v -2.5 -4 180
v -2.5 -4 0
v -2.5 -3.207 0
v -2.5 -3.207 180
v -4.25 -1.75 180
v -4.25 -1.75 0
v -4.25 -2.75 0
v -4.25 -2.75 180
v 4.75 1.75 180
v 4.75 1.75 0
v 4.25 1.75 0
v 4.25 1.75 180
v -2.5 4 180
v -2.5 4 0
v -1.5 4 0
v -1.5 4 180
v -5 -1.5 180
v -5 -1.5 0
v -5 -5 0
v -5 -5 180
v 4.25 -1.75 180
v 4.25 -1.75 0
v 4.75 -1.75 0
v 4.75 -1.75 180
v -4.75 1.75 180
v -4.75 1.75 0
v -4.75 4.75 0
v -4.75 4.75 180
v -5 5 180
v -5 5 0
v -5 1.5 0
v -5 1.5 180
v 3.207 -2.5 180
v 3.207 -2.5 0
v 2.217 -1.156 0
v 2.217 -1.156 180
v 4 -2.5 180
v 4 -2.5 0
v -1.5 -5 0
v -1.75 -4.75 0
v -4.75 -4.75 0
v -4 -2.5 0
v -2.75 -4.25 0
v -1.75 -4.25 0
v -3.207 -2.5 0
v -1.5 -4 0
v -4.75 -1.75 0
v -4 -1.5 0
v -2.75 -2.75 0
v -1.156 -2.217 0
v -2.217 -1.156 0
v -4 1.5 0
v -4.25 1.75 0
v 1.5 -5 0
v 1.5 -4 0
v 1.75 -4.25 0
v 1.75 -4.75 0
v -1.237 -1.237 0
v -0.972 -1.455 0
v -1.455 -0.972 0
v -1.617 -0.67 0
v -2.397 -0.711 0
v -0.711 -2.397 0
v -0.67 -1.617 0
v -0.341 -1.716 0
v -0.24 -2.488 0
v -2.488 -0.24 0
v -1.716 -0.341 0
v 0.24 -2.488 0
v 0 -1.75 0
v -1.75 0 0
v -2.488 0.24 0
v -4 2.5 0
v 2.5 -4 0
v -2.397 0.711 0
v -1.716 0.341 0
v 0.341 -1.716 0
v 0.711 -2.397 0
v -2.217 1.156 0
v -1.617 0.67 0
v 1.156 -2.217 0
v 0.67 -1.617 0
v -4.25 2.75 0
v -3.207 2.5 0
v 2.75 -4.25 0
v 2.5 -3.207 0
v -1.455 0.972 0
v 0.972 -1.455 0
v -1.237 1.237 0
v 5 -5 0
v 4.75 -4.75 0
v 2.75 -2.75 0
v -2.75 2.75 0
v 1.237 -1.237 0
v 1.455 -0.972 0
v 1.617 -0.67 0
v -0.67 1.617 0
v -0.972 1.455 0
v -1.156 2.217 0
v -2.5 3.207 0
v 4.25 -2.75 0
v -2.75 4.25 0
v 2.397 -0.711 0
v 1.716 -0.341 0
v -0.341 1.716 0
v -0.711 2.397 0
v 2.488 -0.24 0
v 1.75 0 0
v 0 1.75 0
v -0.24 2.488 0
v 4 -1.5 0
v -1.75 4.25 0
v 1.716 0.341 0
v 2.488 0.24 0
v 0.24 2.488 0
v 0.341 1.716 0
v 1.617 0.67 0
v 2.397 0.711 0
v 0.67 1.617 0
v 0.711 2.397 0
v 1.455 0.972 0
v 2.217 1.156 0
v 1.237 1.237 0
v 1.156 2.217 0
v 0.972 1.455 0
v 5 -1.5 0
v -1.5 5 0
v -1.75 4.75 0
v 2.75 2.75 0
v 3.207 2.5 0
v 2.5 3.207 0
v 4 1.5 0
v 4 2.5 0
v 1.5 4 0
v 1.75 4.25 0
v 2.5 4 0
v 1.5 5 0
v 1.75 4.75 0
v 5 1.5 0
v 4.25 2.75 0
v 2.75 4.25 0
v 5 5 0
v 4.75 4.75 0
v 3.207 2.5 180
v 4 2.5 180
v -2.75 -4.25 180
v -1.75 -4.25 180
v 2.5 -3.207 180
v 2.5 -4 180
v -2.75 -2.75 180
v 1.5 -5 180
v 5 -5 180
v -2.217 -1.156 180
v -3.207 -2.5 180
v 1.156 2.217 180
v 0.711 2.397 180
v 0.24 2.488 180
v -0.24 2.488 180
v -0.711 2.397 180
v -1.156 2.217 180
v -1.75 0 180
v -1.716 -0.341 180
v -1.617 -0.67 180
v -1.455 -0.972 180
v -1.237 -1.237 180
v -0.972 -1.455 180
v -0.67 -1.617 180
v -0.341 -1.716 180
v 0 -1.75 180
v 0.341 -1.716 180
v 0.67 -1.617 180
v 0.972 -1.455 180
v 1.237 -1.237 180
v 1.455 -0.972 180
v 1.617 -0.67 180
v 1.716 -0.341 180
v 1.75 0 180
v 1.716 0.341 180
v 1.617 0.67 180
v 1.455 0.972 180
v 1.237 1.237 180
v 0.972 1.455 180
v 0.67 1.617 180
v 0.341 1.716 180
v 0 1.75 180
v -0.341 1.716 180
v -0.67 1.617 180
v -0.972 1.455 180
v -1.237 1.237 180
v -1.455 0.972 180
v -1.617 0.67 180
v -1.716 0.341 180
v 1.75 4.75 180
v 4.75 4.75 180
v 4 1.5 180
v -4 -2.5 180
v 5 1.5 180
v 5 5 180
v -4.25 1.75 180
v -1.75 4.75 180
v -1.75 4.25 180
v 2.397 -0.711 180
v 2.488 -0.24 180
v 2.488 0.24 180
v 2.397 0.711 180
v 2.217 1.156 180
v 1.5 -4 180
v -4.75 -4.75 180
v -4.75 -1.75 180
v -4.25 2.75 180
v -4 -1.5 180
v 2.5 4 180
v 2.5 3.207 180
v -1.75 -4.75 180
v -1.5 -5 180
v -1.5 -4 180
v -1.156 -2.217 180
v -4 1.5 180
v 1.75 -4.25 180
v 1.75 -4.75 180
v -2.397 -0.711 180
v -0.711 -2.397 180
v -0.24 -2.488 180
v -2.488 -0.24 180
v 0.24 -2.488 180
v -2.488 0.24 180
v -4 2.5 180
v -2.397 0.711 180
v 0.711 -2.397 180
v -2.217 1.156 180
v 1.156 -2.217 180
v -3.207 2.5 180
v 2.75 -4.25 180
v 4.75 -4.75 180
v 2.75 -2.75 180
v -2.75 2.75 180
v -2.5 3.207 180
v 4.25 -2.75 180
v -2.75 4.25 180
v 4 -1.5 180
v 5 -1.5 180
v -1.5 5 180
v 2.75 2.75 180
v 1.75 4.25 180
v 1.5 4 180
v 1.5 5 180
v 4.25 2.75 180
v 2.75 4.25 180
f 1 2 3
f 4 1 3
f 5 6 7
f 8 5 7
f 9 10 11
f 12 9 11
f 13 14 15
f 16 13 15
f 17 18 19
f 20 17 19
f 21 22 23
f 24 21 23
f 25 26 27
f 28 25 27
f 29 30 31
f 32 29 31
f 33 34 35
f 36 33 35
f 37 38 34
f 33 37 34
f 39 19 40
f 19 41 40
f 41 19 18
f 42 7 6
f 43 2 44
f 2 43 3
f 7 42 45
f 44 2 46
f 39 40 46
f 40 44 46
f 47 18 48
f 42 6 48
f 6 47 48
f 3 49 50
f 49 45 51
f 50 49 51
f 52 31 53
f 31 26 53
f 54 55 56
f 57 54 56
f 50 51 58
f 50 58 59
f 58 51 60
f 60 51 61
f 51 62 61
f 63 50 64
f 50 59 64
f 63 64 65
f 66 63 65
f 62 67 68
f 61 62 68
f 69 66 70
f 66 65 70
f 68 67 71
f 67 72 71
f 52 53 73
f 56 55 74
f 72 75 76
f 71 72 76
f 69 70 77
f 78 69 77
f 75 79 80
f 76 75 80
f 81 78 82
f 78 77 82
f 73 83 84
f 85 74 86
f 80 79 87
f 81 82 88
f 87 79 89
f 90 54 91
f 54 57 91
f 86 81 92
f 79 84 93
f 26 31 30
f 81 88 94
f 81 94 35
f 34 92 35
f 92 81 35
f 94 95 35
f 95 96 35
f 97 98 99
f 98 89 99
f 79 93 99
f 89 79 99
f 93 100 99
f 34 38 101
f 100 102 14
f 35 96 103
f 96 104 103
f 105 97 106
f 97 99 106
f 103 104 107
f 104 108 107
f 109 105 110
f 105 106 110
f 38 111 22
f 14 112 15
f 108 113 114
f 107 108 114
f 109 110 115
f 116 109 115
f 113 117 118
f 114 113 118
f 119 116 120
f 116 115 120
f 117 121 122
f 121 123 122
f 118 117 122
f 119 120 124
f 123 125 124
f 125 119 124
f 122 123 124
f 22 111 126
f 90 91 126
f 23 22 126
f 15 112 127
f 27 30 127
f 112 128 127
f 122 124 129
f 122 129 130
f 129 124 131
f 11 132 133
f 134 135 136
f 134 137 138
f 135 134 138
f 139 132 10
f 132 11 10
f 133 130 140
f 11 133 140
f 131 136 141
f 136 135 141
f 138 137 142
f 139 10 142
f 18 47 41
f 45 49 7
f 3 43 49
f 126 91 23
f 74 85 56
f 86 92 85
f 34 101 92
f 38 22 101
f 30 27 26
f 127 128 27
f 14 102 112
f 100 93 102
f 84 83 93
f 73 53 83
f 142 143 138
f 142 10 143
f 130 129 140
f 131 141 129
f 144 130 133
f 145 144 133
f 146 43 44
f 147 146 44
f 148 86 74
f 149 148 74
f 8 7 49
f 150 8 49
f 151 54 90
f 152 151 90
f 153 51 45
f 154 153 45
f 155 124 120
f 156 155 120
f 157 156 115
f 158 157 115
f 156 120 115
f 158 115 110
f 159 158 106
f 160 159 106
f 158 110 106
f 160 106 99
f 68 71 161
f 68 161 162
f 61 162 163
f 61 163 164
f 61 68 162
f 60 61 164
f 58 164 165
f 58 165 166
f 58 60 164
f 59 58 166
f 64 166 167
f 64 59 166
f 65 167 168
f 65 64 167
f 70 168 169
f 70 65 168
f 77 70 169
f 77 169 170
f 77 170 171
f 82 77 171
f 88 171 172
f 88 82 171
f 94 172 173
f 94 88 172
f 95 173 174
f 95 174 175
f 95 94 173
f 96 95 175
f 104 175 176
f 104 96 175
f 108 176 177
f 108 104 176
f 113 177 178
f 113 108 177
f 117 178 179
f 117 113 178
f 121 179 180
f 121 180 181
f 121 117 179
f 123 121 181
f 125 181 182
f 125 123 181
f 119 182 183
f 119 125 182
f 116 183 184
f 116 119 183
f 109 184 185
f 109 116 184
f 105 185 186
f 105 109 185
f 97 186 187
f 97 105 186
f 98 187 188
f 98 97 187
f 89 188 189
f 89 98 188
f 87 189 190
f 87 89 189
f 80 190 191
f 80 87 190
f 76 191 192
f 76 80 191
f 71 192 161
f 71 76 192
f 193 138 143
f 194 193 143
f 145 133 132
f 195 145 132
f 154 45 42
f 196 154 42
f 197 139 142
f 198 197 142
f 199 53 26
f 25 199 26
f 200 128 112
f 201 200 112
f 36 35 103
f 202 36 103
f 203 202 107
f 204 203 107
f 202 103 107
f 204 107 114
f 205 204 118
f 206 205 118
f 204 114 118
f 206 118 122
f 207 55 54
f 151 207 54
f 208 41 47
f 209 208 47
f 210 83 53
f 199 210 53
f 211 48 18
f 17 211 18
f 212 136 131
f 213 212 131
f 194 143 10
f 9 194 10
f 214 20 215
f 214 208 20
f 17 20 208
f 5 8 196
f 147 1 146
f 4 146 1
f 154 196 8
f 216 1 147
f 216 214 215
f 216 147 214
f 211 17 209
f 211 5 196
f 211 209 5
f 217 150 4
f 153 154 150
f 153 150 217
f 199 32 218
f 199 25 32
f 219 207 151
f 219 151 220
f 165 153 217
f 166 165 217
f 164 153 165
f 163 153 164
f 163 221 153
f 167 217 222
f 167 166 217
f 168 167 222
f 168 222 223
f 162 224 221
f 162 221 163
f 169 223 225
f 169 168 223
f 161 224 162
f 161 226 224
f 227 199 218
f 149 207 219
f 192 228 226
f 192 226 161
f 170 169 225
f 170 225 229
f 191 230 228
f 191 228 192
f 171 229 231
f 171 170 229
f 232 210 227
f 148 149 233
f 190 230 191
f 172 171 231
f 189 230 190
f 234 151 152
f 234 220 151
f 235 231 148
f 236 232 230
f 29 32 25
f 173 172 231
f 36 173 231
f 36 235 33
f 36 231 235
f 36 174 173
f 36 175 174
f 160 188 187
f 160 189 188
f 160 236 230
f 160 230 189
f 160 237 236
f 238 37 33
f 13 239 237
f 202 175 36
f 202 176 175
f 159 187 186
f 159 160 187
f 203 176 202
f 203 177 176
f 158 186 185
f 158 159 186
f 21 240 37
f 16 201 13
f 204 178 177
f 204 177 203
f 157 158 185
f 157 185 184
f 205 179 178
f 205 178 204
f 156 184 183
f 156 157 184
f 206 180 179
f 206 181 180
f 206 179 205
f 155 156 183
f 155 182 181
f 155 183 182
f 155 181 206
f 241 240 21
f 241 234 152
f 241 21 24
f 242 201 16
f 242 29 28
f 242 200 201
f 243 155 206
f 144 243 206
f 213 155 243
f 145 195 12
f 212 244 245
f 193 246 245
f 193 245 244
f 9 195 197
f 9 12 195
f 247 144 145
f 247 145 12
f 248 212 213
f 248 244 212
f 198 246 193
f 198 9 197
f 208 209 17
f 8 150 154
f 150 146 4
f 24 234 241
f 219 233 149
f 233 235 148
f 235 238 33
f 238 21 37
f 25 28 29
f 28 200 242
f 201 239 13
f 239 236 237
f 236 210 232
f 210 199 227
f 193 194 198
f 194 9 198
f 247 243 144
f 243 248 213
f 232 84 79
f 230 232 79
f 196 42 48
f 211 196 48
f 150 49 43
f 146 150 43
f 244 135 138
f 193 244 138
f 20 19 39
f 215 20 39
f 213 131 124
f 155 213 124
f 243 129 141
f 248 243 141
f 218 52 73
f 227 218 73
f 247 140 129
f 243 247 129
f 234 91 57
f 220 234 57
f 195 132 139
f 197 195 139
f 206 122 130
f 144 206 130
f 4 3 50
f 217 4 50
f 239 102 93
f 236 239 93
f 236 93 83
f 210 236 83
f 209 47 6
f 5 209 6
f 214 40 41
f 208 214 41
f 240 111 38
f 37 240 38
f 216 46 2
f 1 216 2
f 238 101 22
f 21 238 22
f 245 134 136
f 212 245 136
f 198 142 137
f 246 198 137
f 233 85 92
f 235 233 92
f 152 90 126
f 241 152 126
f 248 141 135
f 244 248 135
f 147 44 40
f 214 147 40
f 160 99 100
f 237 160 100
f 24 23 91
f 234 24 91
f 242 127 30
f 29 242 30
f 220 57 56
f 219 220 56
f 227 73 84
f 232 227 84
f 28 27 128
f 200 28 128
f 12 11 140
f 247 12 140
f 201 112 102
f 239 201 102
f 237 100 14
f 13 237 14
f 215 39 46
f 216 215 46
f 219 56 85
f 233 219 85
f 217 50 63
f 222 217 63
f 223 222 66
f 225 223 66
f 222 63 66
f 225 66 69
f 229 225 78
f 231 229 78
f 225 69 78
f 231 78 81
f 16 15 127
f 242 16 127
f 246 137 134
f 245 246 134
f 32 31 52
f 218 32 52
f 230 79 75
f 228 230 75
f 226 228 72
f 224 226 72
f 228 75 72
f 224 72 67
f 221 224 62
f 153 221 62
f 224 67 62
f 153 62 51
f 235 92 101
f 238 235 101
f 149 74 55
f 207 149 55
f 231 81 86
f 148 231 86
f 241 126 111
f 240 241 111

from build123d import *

# Parameters (mm, degrees)
ESQUISSE1_R        = 1.75
BOSS_EXTRU_1_DEPTH = 180


with BuildPart() as part:
    # Esquisse1 → Boss.-Extru.1 (new body)
    with BuildSketch(Plane.XY):
        with BuildLine():
            Line((-1.5, 5), (-5, 5))
            Line((-5, 5), (-5, 1.5))
            Line((-5, 1.5), (-4, 1.5))
            Line((-4, 1.5), (-4, 2.5))
            Line((-4, 2.5), (-3.207106781, 2.5))
            Line((-3.207106781, 2.5), (-2.216672281, 1.15601211))
            ThreePointArc((-2.216672281, 1.15601211), (-2.5, 0), (-2.216672281, -1.15601211))
            Line((-2.216672281, -1.15601211), (-3.207106781, -2.5))
            Line((-3.207106781, -2.5), (-4, -2.5))
            Line((-4, -2.5), (-4, -1.5))
            Line((-4, -1.5), (-5, -1.5))
            Line((-5, -1.5), (-5, -5))
            Line((-5, -5), (-1.5, -5))
            Line((-1.5, -5), (-1.5, -4))
            Line((-1.5, -4), (-2.5, -4))
            Line((-2.5, -4), (-2.5, -3.207106781))
            Line((-2.5, -3.207106781), (-1.15601211, -2.216672281))
            ThreePointArc((-1.15601211, -2.216672281), (0, -2.5), (1.15601211, -2.216672281))
            Line((1.15601211, -2.216672281), (2.5, -3.207106781))
            Line((2.5, -3.207106781), (2.5, -4))
            Line((2.5, -4), (1.5, -4))
            Line((1.5, -4), (1.5, -5))
            Line((1.5, -5), (5, -5))
            Line((5, -5), (5, -1.5))
            Line((5, -1.5), (4, -1.5))
            Line((4, -1.5), (4, -2.5))
            Line((4, -2.5), (3.207106781, -2.5))
            Line((3.207106781, -2.5), (2.216672281, -1.15601211))
            ThreePointArc((2.216672281, -1.15601211), (2.5, 0), (2.216672281, 1.15601211))
            Line((2.216672281, 1.15601211), (3.207106781, 2.5))
            Line((3.207106781, 2.5), (4, 2.5))
            Line((4, 2.5), (4, 1.5))
            Line((4, 1.5), (5, 1.5))
            Line((5, 1.5), (5, 5))
            Line((5, 5), (1.5, 5))
            Line((1.5, 5), (1.5, 4))
            Line((1.5, 4), (2.5, 4))
            Line((2.5, 4), (2.5, 3.207106781))
            Line((2.5, 3.207106781), (1.15601211, 2.216672281))
            ThreePointArc((1.15601211, 2.216672281), (0, 2.5), (-1.15601211, 2.216672281))
            Line((-1.15601211, 2.216672281), (-2.5, 3.207106781))
            Line((-2.5, 3.207106781), (-2.5, 4))
            Line((-2.5, 4), (-1.5, 4))
            Line((-1.5, 4), (-1.5, 5))
        make_face()
        Polygon((-4.75, 1.75), (-4.75, 4.75), (-1.75, 4.75), (-1.75, 4.25), (-2.75, 4.25), (-2.75, 2.75), (-4.25, 2.75), (-4.25, 1.75), align=None, mode=Mode.SUBTRACT)
        with Locations(Location((0, 0, 0), (0, 0, 180))):
            Circle(ESQUISSE1_R, mode=Mode.SUBTRACT)
        Polygon((-4.75, -4.75), (-4.75, -1.75), (-4.25, -1.75), (-4.25, -2.75), (-2.75, -2.75), (-2.75, -4.25), (-1.75, -4.25), (-1.75, -4.75), align=None, mode=Mode.SUBTRACT)
        Polygon((4.75, 4.75), (4.75, 1.75), (4.25, 1.75), (4.25, 2.75), (2.75, 2.75), (2.75, 4.25), (1.75, 4.25), (1.75, 4.75), align=None, mode=Mode.SUBTRACT)
        Polygon((4.75, -4.75), (1.75, -4.75), (1.75, -4.25), (2.75, -4.25), (2.75, -2.75), (4.25, -2.75), (4.25, -1.75), (4.75, -1.75), align=None, mode=Mode.SUBTRACT)
    extrude(amount=BOSS_EXTRU_1_DEPTH)


solid = part.part
